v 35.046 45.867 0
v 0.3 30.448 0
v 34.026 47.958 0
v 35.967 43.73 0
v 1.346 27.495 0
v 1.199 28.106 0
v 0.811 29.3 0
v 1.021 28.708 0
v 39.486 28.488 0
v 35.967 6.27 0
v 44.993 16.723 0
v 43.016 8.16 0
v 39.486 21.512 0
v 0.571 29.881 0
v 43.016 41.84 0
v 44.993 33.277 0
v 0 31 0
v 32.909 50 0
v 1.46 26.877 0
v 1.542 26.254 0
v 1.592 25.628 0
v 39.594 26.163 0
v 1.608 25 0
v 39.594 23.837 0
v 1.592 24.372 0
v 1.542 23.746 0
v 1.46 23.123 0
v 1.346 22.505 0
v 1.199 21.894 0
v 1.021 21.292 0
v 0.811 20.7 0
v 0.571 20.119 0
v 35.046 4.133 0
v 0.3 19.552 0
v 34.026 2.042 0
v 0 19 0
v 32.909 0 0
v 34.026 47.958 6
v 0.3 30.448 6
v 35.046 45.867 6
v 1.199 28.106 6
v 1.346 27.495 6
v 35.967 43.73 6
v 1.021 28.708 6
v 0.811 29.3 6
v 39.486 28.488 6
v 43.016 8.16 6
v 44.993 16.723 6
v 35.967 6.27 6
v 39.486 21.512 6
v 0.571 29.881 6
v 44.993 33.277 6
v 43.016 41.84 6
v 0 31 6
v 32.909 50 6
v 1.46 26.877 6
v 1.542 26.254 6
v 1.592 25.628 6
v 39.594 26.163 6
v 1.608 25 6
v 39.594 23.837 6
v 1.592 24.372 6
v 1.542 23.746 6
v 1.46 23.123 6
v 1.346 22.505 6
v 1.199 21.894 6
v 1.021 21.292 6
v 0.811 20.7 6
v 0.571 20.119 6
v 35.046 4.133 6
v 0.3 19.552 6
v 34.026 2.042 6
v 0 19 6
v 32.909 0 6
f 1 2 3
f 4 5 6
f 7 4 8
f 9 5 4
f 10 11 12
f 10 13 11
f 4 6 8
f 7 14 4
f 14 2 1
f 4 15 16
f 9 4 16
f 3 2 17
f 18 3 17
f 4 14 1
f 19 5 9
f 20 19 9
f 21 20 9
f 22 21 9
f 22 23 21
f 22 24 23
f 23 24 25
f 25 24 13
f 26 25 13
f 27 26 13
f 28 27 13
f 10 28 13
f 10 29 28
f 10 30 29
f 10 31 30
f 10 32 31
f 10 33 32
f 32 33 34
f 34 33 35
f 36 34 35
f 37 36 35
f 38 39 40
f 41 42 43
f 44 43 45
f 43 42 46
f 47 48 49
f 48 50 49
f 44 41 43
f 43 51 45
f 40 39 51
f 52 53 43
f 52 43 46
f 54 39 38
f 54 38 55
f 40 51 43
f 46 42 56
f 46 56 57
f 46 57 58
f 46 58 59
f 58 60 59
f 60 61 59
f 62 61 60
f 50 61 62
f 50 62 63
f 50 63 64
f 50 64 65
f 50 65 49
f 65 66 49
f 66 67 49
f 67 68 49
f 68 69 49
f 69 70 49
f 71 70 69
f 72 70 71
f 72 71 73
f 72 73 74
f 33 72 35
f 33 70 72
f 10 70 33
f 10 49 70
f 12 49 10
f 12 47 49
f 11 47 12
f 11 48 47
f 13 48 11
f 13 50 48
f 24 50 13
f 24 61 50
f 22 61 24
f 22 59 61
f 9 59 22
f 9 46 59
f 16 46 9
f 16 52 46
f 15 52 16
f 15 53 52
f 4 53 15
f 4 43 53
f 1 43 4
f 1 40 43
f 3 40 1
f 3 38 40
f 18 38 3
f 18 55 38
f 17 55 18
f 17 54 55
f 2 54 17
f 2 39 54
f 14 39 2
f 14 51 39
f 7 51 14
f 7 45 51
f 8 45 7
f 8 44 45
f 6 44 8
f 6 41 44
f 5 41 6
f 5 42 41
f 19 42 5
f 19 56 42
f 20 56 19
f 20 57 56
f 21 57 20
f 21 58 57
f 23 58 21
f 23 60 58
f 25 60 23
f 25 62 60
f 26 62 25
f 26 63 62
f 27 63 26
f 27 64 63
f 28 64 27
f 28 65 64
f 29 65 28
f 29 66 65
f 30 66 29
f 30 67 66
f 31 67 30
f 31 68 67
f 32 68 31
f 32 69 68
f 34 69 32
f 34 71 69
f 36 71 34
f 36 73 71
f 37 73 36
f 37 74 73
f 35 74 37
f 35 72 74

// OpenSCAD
$fn = 32;

// ----------------------------------------------------------------------
// Gear sector: 2 teeth on 60 degrees
// ----------------------------------------------------------------------

// --- parameters (mm) ---
sector_angle = 60;        // sector angle, degrees
root_r = 50;              // root circle radius
tooth_h = 6;              // tooth height over the root circle
teeth = 2;                // number of teeth on the sector
hub_r = 12;               // hub bore radius
plate_t = 6;              // sector thickness, Z
arc_step = 3;             // sampling step of the root/hub arcs, degrees

tip_r = root_r + tooth_h;  // tip circle radius

profile = [[32.909, 0], [34.026, 2.042], [35.046, 4.133], [35.967, 6.27], [43.016, 8.16], [44.993, 16.723], [39.486, 21.512], [39.594, 23.837], [39.594, 26.163], [39.486, 28.488], [44.993, 33.277], [43.016, 41.84], [35.967, 43.73], [35.046, 45.867], [34.026, 47.958], [32.909, 50], [0, 31], [0.3, 30.448], [0.571, 29.881], [0.811, 29.3], [1.021, 28.708], [1.199, 28.106], [1.346, 27.495], [1.46, 26.877], [1.542, 26.254], [1.592, 25.628], [1.608, 25], [1.592, 24.372], [1.542, 23.746], [1.46, 23.123], [1.346, 22.505], [1.199, 21.894], [1.021, 21.292], [0.811, 20.7], [0.571, 20.119], [0.3, 19.552], [0, 19]];  // primary outline, 37 points, counter clockwise

// --- the one profile operation ---
linear_extrude(height = plate_t) polygon(points = profile);
